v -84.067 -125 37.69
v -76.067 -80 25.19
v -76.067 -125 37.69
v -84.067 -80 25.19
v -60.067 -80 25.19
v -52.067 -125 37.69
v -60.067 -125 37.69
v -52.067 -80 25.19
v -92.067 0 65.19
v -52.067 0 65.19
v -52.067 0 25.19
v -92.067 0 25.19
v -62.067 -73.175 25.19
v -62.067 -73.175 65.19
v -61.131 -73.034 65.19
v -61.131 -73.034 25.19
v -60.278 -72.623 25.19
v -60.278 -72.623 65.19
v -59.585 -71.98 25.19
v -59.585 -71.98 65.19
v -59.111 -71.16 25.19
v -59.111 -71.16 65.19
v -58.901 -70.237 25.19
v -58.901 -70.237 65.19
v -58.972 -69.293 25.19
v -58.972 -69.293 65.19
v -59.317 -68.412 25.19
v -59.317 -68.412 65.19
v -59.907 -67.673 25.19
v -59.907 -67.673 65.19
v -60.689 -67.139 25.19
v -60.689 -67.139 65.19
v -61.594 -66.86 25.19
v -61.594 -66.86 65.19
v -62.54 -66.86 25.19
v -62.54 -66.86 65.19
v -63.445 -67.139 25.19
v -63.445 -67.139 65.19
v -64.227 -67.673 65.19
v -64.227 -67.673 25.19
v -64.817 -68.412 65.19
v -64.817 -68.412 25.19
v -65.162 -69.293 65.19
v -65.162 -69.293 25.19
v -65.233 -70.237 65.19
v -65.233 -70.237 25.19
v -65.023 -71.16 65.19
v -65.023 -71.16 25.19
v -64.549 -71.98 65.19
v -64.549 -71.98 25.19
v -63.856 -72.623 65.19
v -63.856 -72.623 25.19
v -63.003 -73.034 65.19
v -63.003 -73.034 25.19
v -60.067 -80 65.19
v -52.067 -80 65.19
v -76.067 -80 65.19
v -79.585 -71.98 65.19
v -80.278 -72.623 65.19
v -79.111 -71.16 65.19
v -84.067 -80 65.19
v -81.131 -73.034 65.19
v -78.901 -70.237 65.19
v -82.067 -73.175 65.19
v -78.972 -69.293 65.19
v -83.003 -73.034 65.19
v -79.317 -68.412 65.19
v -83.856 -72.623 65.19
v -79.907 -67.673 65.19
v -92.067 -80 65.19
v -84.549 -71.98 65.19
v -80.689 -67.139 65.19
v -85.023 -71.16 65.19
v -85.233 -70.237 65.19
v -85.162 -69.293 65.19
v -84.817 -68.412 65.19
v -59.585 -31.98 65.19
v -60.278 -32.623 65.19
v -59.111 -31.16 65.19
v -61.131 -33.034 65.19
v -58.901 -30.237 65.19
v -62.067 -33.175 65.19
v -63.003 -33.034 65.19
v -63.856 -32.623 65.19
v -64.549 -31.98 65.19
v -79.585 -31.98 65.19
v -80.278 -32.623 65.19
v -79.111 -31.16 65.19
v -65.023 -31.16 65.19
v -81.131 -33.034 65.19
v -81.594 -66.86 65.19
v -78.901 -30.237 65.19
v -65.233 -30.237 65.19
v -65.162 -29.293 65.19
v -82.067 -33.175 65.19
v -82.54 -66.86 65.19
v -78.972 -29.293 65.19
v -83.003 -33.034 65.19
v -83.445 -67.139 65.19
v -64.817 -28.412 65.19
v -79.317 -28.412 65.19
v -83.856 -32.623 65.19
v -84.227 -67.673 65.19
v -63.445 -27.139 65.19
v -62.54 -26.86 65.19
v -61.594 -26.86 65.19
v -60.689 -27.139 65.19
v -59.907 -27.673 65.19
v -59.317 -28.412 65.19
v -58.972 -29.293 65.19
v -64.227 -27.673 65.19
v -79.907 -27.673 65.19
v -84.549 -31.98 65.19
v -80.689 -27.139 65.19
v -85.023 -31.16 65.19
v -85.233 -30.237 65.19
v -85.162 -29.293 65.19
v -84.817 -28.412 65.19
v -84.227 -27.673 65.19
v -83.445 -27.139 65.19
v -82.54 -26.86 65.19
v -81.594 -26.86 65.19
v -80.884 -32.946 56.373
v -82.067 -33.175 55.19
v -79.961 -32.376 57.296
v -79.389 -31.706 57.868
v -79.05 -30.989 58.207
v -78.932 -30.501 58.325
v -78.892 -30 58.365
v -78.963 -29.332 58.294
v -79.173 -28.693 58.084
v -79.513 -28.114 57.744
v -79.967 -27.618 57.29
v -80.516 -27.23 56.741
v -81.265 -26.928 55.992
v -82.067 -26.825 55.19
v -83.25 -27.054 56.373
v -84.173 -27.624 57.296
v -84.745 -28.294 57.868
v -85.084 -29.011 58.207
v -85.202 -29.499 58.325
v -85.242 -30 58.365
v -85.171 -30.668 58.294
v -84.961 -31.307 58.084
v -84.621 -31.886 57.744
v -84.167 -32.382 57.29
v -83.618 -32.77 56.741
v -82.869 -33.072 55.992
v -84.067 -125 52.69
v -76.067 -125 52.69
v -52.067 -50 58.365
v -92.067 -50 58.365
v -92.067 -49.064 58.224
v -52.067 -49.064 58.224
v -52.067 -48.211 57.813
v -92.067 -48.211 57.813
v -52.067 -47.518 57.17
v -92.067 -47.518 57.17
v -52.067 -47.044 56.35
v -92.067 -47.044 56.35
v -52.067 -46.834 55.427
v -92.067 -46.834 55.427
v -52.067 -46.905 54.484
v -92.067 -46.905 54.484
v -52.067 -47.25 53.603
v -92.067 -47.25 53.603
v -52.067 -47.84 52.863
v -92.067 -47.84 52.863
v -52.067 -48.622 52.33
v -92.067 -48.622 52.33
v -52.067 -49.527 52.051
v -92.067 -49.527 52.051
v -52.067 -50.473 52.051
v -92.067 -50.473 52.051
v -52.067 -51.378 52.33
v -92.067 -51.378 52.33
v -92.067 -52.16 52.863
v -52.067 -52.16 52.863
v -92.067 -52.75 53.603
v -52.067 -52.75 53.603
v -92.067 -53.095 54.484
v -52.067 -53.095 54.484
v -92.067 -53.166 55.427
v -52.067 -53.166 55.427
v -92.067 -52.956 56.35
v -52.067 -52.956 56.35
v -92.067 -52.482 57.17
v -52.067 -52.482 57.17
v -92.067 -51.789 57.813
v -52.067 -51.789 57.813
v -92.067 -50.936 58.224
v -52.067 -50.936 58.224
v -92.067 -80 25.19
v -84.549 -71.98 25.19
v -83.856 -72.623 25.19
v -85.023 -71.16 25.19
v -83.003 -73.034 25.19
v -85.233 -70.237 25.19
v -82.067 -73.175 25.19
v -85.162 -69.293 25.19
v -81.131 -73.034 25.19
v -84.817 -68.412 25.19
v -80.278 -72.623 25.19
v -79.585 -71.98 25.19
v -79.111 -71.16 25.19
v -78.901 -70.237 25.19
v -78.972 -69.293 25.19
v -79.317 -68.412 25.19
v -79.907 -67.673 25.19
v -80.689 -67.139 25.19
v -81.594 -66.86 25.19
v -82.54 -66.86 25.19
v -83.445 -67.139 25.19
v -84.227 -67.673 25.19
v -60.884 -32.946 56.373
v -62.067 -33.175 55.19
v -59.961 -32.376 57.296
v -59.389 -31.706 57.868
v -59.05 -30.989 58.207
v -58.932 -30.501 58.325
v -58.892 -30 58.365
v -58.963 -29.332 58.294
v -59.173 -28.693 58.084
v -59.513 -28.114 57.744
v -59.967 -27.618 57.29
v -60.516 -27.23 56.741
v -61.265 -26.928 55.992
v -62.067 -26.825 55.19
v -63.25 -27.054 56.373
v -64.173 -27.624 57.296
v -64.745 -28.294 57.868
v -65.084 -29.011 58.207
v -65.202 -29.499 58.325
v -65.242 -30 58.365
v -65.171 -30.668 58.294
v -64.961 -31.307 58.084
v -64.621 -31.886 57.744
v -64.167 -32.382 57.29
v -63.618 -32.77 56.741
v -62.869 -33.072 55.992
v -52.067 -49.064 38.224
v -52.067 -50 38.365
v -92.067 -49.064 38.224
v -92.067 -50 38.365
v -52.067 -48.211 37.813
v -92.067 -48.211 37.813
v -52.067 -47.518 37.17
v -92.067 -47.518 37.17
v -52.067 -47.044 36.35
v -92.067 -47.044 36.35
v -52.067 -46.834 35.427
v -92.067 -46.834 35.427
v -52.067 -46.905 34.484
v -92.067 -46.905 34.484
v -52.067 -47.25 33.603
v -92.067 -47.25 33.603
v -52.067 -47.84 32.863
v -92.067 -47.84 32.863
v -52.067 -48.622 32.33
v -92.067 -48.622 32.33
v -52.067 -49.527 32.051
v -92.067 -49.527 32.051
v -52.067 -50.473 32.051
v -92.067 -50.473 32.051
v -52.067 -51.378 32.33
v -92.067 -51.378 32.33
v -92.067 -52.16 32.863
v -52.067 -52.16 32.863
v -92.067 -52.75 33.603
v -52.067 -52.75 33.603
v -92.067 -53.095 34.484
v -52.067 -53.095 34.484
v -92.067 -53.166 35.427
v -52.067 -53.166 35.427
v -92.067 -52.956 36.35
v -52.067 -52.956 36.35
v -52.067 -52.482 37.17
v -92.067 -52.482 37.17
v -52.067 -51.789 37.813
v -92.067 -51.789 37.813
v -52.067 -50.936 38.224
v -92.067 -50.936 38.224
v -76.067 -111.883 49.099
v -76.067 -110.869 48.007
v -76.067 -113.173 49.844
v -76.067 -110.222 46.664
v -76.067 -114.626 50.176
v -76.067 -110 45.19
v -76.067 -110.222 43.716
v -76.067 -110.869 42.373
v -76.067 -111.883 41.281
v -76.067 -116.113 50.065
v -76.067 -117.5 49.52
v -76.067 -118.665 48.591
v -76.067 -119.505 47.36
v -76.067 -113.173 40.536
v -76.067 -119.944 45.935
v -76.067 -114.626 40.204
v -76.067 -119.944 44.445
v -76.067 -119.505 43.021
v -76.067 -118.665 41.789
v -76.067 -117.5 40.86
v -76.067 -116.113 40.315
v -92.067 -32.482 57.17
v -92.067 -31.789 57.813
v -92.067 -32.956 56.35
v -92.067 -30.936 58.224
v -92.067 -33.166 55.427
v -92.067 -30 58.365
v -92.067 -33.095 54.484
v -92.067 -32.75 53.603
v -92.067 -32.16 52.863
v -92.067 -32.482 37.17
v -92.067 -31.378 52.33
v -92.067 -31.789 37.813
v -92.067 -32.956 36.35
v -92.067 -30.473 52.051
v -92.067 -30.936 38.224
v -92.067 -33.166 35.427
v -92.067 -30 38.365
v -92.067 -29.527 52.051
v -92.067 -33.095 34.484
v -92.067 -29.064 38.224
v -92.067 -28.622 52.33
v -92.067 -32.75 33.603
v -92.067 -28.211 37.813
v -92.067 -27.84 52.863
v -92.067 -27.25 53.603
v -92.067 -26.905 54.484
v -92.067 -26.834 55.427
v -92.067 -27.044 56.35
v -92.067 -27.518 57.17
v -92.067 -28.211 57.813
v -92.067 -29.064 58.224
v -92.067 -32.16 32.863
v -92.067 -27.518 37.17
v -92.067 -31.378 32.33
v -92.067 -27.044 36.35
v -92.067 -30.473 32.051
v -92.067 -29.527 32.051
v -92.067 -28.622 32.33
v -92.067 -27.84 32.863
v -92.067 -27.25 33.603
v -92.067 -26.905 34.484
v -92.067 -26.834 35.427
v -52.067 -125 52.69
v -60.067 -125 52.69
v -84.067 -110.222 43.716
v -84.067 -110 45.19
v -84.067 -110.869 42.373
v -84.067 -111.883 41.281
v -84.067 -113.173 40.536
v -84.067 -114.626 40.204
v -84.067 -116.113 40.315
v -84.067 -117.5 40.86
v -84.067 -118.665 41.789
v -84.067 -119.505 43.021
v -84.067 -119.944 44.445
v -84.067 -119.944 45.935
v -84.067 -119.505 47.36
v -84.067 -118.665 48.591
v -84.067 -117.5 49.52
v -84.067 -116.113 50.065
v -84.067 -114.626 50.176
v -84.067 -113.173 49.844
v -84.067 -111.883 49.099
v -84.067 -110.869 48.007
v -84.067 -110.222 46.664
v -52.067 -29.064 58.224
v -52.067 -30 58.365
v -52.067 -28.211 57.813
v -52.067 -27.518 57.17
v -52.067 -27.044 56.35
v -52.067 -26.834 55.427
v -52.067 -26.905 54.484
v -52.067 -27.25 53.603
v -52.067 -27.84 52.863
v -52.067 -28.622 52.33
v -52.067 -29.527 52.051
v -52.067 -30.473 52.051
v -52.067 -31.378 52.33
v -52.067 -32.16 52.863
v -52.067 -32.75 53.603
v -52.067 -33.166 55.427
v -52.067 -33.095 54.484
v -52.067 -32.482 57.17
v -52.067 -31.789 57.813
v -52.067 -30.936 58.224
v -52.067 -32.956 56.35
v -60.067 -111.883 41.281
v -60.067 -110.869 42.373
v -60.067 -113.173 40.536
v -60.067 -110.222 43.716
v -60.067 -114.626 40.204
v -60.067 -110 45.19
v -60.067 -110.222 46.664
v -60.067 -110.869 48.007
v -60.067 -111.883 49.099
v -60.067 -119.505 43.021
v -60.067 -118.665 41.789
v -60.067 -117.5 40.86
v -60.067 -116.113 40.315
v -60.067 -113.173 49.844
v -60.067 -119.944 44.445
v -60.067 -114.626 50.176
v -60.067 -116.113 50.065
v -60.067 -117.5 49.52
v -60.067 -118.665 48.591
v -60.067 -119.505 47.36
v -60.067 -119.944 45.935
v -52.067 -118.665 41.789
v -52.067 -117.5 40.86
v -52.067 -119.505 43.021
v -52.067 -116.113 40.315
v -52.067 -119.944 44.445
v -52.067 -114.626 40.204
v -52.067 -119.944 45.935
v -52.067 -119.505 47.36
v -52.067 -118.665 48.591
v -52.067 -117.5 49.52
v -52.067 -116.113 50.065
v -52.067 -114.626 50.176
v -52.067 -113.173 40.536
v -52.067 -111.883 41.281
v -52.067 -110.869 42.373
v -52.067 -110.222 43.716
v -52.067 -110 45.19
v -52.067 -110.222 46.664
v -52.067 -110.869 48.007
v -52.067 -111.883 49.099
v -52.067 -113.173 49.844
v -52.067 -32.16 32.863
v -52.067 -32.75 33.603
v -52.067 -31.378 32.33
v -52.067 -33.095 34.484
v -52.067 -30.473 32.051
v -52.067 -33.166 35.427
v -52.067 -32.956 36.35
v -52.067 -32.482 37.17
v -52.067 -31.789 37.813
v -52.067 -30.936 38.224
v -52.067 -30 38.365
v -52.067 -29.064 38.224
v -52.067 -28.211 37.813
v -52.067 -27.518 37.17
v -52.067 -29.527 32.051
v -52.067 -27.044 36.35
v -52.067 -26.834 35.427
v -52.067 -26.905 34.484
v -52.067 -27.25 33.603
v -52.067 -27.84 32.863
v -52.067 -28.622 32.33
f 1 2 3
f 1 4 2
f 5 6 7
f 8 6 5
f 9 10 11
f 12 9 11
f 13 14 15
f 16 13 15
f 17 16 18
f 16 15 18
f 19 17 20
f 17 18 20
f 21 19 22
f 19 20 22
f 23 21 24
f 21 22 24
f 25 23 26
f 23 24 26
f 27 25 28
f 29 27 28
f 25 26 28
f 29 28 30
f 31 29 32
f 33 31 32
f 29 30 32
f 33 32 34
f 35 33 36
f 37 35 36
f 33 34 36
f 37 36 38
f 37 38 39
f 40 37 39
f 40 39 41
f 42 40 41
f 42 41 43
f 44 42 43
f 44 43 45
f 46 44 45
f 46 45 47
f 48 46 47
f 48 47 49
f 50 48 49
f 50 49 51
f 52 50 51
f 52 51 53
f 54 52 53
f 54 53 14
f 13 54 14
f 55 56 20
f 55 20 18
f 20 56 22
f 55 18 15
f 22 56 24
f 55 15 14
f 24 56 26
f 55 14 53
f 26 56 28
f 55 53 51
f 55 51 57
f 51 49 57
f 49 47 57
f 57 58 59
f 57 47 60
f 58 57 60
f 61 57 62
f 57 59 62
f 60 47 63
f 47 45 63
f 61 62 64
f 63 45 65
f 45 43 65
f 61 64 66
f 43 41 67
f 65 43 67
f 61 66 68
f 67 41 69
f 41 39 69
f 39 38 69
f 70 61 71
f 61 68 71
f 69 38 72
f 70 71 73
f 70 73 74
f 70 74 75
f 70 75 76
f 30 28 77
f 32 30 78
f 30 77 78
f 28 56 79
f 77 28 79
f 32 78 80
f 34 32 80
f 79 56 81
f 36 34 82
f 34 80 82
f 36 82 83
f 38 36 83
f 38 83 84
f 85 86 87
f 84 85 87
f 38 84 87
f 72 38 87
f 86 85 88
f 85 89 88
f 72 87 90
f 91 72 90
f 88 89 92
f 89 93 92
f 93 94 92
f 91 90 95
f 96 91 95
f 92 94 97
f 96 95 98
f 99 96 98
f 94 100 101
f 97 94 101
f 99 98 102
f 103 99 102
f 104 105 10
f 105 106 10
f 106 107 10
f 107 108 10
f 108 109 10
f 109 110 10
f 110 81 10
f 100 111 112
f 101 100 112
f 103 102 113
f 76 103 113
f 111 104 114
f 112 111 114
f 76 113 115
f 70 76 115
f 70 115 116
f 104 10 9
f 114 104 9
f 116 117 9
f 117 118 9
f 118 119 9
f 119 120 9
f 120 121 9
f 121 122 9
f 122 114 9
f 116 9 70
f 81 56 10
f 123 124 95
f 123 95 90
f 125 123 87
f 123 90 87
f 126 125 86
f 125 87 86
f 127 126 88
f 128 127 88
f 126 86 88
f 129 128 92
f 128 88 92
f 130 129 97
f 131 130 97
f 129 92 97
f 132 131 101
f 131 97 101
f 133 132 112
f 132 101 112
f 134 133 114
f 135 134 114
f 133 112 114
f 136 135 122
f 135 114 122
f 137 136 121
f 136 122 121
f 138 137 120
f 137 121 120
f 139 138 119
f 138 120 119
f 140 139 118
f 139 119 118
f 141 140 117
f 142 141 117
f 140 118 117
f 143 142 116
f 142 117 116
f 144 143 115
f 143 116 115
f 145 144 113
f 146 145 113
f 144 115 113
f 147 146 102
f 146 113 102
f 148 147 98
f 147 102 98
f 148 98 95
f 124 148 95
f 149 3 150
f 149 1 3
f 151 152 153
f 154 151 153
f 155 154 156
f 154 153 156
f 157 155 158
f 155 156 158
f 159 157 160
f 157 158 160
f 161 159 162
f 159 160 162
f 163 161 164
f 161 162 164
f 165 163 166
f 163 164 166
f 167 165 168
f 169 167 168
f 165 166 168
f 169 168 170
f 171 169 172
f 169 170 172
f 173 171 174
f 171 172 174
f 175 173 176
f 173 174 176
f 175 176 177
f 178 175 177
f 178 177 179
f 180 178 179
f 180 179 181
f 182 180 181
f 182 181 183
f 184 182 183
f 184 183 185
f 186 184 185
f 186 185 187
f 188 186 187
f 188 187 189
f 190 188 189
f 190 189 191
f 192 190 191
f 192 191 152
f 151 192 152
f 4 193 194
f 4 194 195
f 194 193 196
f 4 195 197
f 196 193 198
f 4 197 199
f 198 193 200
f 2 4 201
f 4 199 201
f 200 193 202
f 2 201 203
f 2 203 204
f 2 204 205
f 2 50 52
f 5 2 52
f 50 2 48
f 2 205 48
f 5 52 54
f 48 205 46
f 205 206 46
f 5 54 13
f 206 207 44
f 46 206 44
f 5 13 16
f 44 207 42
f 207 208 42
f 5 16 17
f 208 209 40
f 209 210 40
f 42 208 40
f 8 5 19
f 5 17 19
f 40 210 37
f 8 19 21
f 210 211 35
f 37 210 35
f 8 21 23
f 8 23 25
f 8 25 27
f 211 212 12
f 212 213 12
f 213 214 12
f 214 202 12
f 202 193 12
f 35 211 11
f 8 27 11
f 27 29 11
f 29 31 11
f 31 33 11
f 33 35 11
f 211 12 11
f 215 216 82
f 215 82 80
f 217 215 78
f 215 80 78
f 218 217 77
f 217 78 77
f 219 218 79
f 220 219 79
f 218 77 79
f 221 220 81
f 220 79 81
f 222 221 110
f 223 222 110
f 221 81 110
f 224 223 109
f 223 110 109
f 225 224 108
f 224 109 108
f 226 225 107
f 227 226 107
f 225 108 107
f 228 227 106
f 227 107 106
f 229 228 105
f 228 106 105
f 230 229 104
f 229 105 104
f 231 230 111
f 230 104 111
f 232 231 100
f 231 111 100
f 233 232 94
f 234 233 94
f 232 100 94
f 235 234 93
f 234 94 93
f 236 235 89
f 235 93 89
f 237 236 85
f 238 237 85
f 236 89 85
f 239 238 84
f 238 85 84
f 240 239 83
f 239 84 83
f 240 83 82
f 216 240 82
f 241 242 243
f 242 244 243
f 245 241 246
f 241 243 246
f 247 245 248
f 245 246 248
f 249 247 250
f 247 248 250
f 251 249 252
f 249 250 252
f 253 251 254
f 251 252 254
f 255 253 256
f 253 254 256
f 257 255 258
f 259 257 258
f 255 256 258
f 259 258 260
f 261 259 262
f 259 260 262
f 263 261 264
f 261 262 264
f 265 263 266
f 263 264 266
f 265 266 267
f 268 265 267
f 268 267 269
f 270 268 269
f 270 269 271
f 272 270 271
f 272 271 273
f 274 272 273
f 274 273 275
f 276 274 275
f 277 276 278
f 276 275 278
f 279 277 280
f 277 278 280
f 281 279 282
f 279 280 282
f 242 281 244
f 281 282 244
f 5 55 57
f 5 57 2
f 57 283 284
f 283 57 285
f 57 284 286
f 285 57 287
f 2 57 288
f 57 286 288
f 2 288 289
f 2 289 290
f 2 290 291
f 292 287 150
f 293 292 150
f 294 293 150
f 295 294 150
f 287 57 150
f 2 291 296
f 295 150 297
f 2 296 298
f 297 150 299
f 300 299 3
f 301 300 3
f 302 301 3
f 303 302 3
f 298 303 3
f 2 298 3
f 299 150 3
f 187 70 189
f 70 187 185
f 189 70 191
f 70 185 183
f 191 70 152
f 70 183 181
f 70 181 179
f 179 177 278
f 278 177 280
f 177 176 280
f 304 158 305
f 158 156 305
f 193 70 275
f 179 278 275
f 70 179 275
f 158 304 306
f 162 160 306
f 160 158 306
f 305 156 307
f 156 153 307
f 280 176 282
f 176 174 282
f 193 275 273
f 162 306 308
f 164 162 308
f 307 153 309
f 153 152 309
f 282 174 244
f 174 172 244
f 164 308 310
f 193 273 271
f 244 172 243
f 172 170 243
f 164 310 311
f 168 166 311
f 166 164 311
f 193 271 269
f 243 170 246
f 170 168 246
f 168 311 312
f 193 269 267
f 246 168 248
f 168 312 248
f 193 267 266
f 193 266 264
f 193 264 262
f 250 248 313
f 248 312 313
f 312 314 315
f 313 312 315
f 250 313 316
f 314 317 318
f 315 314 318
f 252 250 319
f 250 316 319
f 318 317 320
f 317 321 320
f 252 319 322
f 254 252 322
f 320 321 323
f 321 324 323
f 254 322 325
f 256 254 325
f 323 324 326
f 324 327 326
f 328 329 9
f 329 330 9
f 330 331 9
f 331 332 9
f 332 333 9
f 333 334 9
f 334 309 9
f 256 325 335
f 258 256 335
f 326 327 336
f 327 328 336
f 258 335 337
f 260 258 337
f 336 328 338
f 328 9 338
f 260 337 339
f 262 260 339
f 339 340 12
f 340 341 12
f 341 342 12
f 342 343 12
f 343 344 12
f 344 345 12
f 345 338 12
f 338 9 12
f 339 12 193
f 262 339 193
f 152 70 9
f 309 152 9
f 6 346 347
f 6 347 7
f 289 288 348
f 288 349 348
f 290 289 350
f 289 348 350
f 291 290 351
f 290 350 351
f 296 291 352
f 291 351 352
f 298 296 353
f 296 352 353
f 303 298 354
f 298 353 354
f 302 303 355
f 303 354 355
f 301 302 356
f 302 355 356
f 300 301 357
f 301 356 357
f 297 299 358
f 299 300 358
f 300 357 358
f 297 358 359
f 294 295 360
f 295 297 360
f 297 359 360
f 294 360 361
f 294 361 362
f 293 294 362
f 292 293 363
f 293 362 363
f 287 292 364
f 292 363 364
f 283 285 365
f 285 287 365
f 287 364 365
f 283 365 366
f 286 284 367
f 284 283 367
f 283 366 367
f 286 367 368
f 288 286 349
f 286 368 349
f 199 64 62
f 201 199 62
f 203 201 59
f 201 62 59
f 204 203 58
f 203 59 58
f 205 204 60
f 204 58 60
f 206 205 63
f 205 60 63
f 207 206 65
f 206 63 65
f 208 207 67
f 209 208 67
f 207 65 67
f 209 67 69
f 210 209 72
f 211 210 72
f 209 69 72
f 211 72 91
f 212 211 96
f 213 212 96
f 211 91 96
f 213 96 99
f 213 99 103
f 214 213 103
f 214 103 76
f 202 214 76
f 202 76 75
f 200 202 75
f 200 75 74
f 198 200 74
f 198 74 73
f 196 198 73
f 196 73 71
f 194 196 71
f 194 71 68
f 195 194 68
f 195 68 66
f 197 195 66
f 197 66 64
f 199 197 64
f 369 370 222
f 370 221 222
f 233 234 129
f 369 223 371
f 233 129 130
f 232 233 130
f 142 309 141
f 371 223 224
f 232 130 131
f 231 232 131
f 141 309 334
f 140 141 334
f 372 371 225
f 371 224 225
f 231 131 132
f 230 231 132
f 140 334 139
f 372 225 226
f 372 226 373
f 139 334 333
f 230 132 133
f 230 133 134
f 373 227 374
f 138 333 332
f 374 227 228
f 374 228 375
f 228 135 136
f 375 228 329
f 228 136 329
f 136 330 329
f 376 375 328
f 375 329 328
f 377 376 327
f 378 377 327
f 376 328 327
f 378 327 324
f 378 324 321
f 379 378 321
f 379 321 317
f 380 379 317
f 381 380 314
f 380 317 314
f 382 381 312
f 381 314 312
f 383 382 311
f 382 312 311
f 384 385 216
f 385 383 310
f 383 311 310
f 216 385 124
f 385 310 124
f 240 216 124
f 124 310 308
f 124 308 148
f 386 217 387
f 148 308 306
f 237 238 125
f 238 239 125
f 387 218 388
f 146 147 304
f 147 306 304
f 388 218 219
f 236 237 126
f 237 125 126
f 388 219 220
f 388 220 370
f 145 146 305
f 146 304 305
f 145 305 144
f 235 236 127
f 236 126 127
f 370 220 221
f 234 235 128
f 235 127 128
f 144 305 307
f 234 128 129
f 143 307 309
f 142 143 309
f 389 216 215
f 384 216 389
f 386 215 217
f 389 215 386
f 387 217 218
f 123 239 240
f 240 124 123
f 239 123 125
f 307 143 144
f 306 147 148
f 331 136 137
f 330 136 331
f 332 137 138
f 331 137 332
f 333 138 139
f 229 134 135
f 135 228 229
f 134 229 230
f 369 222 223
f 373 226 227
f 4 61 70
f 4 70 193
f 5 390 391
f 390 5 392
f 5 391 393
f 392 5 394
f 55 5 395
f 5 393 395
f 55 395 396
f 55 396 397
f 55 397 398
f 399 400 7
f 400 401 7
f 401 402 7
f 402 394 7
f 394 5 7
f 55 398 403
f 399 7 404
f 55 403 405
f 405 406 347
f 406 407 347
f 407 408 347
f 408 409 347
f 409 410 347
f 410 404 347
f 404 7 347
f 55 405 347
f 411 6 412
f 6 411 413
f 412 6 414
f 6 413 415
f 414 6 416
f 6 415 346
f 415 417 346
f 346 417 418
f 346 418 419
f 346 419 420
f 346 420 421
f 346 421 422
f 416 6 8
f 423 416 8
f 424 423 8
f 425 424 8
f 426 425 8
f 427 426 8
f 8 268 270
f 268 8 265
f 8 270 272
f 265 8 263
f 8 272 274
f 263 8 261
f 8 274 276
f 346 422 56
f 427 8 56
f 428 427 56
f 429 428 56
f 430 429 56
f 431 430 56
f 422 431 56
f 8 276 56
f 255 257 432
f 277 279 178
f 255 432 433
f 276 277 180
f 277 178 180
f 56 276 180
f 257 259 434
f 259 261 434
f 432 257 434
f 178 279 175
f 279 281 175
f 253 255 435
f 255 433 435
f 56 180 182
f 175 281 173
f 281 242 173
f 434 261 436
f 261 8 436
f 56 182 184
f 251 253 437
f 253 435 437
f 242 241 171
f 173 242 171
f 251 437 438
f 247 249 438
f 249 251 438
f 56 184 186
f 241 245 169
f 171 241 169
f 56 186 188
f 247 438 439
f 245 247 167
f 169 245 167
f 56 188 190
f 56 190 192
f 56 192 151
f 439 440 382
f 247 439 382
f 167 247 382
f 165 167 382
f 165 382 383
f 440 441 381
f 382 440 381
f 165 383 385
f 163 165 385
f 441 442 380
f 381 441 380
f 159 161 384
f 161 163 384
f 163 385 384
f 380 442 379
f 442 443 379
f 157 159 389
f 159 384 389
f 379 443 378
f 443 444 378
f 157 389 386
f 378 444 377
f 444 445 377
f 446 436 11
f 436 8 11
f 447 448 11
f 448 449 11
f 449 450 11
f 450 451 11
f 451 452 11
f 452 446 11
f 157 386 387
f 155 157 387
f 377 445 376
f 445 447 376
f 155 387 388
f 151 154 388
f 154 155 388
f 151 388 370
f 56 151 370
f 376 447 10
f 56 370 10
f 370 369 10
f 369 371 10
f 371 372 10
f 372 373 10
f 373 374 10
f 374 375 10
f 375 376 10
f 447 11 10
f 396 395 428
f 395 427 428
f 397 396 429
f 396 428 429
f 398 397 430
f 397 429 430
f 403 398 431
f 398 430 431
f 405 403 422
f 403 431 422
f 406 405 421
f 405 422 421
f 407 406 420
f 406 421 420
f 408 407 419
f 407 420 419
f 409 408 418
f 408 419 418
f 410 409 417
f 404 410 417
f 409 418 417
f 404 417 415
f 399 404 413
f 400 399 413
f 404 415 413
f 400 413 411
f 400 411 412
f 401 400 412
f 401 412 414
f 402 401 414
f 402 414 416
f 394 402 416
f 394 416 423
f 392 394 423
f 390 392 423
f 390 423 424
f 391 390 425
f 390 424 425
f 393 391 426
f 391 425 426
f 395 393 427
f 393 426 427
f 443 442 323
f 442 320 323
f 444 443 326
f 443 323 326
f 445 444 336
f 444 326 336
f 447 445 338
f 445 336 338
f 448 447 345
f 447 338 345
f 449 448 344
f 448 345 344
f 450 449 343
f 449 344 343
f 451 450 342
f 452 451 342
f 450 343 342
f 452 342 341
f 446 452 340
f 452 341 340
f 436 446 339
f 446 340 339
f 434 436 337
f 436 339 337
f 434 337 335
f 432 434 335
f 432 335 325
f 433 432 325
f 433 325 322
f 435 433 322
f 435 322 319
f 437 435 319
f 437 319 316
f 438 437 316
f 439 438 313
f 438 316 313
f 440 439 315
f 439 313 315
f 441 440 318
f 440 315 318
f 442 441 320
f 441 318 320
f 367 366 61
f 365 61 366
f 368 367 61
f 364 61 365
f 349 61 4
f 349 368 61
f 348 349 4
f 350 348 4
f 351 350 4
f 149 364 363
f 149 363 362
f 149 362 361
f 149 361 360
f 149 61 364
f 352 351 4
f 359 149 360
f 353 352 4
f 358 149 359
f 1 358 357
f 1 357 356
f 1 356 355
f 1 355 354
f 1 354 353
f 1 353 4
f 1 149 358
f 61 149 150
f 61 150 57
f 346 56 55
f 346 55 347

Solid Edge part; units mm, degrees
sketch "Sketch1" plane through (0, 0, 0) normal (0, -1, 0) x (1, 0, 0)
  line L0 (-92.067, 25.1901) -> (-52.067, 25.1901)
  line L1 (-52.067, 25.1901) -> (-52.067, 65.1901)
  line L2 (-52.067, 65.1901) -> (-92.067, 65.1901)
  line L3 (-92.067, 65.1901) -> (-92.067, 25.1901)
  dimension "D1" = 40
  dimension "D2" = 40
extrude "Protrusion1" add sketch "Sketch1" along normal blind 80
sketch "Sketch2" plane through (-52.067, -75, 45.1901) normal (1, 0, 0) x (0, 1, 0)
  circle A0 centre (-40, 0) radius 5
  line L0 (-5, 20) -> (-50, 7.5)
  line L1 (-50, 7.5) -> (-50, -7.5)
  line L2 (-50, -7.5) -> (-5, -20)
  line L3 (-5, -20) -> (-5, 20)
  dimension "D1" = 10
  dimension "D2" = 15
  dimension "D3" = 10
  dimension "D4" = 45
extrude "ExtrudedProtrusion_2" add sketch "Sketch2" against normal blind 8
mirror "Mirror1" about plane through (-68.067, -90.8694, 45.1901) normal (1, 0, 0) of "ExtrudedProtrusion_2"
hole "Hole_1" at (-92.067, -50, 55.1901) direction (1, 0, 0) diameter 6.35 end up to next
hole "Hole1" at (-92.067, -30, 35.1901) direction (1, 0, 0) diameter 6.35 end up to next
hole "Hole2" at (-92.067, -50, 35.1901) direction (1, 0, 0) diameter 6.35 end up to next
hole "Hole3" at (-92.067, -30, 55.1901) direction (1, 0, 0) diameter 6.35 end up to next
hole "Hole_5" at (-62.067, -30, 65.1901) direction (0, 0, -1) diameter 6.35 end up to next
hole "Hole4" at (-82.067, -30, 65.1901) direction (0, 0, -1) diameter 6.35 end up to next
hole "Hole5" at (-82.067, -70, 65.1901) direction (0, 0, -1) diameter 6.35 end up to next
hole "Hole6" at (-62.067, -70, 65.1901) direction (0, 0, -1) diameter 6.35 end up to next
properties material "Aluminum, 6061-T6"
